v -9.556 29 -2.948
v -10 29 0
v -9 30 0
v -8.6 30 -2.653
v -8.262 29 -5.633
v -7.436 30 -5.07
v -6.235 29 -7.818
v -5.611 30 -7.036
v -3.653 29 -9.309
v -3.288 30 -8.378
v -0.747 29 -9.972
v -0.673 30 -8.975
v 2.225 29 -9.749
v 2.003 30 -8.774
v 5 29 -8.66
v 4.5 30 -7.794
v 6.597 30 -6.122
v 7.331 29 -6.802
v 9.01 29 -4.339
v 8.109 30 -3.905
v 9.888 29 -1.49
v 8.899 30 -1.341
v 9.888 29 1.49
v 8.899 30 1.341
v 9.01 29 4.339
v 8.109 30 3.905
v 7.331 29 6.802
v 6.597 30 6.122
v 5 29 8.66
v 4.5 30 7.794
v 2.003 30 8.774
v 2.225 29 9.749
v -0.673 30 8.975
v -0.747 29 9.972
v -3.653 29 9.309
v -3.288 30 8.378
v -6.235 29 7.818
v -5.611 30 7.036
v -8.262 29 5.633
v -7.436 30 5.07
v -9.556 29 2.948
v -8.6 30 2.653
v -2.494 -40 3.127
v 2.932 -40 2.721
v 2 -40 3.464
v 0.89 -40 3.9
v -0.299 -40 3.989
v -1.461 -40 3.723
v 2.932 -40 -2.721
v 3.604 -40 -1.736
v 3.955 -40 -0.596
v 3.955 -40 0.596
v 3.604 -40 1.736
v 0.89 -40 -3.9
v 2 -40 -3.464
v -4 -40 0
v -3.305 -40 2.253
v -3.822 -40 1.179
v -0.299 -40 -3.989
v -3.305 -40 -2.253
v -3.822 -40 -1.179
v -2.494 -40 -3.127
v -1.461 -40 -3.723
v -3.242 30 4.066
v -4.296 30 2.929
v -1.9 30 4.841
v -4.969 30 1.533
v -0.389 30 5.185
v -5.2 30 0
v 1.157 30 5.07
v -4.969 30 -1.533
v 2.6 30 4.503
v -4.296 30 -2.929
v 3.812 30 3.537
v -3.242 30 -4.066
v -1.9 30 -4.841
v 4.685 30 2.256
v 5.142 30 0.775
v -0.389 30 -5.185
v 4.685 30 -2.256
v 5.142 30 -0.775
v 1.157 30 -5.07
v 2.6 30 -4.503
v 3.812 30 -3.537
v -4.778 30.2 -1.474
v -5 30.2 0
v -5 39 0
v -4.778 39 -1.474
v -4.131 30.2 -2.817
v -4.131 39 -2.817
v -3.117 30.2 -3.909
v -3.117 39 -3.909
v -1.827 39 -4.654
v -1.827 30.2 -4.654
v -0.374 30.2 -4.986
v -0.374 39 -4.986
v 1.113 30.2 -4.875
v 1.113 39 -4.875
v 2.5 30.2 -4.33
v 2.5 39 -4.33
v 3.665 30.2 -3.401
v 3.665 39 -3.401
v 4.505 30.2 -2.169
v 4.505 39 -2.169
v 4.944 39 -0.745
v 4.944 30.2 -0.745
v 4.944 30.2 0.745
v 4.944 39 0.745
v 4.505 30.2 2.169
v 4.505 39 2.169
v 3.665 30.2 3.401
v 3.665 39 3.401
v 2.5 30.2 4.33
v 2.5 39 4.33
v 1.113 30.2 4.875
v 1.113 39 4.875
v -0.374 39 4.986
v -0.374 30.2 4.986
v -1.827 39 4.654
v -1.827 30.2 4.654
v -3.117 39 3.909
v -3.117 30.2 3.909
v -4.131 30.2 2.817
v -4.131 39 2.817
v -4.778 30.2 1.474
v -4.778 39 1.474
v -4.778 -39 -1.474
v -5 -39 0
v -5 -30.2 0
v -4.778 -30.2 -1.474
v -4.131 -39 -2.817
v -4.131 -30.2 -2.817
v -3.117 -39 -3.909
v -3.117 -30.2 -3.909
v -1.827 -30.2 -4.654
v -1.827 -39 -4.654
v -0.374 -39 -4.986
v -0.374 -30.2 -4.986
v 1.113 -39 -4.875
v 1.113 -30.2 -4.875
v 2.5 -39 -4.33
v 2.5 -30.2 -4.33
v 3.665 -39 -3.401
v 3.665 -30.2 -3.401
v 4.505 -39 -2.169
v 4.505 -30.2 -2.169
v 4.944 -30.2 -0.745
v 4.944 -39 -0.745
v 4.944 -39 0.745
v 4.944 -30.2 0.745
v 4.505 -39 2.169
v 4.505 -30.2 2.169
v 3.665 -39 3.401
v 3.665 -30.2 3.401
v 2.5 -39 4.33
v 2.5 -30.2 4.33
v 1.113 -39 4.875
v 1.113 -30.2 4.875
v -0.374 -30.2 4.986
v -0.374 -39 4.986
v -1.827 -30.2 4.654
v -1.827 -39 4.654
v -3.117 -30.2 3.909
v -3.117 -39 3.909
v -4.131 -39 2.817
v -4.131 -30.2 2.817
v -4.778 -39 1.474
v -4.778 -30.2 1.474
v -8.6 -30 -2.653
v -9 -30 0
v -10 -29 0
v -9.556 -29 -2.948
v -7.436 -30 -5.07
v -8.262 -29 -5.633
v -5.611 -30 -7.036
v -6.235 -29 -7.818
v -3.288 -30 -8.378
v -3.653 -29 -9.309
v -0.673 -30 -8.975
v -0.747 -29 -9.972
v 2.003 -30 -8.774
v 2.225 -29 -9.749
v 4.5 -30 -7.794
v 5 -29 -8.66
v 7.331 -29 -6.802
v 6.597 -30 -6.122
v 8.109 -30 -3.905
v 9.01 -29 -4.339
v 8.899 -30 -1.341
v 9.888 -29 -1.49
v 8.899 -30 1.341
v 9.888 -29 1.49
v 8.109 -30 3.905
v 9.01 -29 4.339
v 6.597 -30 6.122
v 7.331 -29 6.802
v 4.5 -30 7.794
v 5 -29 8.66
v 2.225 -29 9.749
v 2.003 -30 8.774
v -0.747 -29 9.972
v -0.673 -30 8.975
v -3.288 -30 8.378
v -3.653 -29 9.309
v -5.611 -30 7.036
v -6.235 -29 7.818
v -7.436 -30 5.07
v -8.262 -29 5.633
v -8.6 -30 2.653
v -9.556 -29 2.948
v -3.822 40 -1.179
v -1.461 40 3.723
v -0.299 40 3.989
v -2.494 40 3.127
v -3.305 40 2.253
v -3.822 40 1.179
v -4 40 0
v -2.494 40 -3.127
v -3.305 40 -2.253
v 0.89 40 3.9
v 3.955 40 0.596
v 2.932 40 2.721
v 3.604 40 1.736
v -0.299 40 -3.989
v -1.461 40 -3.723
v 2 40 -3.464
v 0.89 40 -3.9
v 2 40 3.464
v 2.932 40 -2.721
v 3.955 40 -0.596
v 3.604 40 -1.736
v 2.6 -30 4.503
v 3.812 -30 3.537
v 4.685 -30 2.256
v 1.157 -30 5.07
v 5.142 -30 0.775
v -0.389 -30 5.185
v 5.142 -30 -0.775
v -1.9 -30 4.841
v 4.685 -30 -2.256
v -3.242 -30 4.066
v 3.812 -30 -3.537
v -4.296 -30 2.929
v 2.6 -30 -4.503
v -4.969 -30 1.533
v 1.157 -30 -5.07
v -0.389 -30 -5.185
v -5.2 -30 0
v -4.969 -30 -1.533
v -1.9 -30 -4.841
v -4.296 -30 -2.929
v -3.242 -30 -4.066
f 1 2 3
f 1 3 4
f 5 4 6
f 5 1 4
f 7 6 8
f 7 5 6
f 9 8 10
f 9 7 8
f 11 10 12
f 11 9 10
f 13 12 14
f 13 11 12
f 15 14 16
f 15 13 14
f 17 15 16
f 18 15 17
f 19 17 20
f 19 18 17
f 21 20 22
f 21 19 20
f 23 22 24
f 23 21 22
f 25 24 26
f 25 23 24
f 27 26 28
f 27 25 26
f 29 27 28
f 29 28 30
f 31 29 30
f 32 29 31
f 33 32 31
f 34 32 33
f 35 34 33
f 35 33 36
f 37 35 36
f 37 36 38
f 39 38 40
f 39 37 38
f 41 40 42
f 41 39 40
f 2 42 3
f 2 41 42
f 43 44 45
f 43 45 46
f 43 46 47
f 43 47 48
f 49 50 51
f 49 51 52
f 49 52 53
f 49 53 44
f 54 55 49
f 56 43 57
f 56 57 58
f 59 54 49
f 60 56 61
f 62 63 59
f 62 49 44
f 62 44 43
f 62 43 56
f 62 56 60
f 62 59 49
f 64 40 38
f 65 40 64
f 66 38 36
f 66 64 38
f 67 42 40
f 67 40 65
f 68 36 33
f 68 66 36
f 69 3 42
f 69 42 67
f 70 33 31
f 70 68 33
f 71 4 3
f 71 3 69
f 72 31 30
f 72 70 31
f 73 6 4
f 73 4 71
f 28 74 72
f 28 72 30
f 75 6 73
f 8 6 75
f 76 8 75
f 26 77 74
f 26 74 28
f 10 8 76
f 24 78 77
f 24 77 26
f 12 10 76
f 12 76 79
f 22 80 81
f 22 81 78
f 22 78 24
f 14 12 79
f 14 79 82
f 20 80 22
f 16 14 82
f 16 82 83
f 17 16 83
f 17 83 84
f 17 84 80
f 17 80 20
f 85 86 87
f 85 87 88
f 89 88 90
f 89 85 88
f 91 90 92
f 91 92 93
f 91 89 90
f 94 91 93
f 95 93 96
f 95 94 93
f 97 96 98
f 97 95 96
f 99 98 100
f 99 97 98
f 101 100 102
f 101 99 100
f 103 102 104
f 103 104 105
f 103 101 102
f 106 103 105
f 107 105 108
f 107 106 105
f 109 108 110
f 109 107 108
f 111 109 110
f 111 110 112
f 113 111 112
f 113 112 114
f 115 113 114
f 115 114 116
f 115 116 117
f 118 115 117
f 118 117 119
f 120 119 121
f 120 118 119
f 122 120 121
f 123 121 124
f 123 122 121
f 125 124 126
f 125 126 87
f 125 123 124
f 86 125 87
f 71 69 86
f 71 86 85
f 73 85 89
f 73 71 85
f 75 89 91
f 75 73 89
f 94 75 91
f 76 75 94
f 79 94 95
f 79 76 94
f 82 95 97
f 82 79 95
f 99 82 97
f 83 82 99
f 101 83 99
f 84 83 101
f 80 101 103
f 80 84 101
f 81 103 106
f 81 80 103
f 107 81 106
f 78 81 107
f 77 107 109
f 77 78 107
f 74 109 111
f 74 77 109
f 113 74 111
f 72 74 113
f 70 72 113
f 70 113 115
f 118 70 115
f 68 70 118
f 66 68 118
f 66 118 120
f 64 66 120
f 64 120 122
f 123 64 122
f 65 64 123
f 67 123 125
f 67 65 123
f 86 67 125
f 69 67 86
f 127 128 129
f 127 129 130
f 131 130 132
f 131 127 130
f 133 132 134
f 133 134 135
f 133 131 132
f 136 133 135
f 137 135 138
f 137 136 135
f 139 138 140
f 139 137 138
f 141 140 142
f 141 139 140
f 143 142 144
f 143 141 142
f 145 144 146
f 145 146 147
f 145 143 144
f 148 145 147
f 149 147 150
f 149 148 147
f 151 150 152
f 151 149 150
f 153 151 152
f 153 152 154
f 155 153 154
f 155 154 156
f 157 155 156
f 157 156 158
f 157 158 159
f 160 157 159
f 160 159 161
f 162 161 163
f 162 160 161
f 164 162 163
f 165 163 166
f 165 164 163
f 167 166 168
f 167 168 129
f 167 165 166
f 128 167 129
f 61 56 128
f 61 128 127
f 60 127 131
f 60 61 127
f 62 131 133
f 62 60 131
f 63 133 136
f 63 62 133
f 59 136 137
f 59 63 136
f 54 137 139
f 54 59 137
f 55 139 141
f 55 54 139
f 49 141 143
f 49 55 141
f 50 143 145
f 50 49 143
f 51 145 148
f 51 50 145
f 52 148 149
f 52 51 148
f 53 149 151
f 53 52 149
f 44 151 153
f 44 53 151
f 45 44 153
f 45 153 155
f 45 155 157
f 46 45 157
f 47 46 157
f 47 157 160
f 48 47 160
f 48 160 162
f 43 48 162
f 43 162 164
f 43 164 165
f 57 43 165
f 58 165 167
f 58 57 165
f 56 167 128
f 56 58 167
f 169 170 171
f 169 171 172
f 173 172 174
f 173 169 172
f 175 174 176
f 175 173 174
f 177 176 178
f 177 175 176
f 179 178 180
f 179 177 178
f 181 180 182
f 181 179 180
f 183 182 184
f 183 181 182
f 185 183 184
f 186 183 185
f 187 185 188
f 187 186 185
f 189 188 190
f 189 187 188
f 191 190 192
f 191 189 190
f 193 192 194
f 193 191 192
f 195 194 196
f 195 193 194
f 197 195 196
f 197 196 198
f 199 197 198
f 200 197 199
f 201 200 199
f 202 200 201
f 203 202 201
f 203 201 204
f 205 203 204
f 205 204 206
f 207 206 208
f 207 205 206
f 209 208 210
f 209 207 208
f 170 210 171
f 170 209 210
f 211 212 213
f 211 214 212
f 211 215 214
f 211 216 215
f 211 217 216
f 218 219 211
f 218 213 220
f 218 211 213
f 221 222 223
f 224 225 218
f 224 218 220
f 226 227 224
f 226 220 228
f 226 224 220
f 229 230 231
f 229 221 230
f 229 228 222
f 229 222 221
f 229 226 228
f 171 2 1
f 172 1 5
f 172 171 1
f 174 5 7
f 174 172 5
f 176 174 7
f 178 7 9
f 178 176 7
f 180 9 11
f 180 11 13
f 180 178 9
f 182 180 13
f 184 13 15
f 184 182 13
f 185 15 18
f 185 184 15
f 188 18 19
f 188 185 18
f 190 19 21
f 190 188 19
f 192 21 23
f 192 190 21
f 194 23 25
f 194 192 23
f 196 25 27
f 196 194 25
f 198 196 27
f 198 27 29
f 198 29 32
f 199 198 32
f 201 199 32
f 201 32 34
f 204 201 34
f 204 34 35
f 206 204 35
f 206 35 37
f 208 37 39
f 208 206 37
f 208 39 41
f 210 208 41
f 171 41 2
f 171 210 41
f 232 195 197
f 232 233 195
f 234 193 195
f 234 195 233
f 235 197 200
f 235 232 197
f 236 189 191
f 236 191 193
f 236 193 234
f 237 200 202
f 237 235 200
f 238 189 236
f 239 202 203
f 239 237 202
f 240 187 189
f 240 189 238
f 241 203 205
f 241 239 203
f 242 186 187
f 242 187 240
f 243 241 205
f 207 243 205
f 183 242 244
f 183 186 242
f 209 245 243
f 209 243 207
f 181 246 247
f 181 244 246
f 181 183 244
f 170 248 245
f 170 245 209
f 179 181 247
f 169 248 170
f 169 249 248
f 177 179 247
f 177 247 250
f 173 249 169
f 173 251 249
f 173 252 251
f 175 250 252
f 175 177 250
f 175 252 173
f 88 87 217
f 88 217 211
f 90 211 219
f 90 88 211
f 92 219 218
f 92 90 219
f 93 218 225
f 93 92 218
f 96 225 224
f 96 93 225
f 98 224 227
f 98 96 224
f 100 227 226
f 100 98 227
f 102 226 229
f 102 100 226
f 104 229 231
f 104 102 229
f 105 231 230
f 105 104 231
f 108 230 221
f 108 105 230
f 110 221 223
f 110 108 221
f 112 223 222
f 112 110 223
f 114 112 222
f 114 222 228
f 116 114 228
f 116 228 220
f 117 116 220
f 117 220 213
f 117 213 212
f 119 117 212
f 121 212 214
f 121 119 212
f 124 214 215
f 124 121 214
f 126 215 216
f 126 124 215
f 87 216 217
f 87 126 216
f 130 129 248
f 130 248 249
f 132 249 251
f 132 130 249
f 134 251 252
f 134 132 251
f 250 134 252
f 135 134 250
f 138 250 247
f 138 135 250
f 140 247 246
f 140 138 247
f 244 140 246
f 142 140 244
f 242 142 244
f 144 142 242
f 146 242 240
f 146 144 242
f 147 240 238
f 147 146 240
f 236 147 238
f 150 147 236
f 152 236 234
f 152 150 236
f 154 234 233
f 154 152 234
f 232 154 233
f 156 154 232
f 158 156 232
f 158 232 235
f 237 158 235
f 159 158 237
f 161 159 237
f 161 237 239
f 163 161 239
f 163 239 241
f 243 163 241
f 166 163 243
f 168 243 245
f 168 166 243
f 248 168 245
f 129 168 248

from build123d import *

# Parameters (mm, degrees)
CHAMFER_1_SIZE = 1
CHAMFER_2_SIZE = 0.2


with BuildPart() as part:
    # 草图1 → 旋转1 (revolve)
    with BuildSketch(Plane.XY, mode=Mode.PRIVATE) as revolve_1_sk:
        Polygon((0, 40), (5, 40), (5, 30), (10, 30), (10, -30), (5, -30), (5, -40), (0, -40), align=None)
    revolve(revolve_1_sk.sketch.rotate(Axis((0, 40, 0), (0, -1, 0)), 180), axis=Axis((0, 40, 0), (0, -1, 0)))

    # 倒角1
    chamfer_1_edges = [part.edges().sort_by_distance(p)[0] for p in [
        (5, -40, 0),
        (10, -30, 0),
        (10, 30, 0),
        (5, 40, 0),
    ]]
    chamfer(chamfer_1_edges, length=CHAMFER_1_SIZE)

    # 倒角2
    chamfer_2_edges = [part.edges().sort_by_distance(p)[0] for p in [
        (5, -30, 0),
        (5, 30, 0),
    ]]
    chamfer(chamfer_2_edges, length=CHAMFER_2_SIZE)


solid = part.part
